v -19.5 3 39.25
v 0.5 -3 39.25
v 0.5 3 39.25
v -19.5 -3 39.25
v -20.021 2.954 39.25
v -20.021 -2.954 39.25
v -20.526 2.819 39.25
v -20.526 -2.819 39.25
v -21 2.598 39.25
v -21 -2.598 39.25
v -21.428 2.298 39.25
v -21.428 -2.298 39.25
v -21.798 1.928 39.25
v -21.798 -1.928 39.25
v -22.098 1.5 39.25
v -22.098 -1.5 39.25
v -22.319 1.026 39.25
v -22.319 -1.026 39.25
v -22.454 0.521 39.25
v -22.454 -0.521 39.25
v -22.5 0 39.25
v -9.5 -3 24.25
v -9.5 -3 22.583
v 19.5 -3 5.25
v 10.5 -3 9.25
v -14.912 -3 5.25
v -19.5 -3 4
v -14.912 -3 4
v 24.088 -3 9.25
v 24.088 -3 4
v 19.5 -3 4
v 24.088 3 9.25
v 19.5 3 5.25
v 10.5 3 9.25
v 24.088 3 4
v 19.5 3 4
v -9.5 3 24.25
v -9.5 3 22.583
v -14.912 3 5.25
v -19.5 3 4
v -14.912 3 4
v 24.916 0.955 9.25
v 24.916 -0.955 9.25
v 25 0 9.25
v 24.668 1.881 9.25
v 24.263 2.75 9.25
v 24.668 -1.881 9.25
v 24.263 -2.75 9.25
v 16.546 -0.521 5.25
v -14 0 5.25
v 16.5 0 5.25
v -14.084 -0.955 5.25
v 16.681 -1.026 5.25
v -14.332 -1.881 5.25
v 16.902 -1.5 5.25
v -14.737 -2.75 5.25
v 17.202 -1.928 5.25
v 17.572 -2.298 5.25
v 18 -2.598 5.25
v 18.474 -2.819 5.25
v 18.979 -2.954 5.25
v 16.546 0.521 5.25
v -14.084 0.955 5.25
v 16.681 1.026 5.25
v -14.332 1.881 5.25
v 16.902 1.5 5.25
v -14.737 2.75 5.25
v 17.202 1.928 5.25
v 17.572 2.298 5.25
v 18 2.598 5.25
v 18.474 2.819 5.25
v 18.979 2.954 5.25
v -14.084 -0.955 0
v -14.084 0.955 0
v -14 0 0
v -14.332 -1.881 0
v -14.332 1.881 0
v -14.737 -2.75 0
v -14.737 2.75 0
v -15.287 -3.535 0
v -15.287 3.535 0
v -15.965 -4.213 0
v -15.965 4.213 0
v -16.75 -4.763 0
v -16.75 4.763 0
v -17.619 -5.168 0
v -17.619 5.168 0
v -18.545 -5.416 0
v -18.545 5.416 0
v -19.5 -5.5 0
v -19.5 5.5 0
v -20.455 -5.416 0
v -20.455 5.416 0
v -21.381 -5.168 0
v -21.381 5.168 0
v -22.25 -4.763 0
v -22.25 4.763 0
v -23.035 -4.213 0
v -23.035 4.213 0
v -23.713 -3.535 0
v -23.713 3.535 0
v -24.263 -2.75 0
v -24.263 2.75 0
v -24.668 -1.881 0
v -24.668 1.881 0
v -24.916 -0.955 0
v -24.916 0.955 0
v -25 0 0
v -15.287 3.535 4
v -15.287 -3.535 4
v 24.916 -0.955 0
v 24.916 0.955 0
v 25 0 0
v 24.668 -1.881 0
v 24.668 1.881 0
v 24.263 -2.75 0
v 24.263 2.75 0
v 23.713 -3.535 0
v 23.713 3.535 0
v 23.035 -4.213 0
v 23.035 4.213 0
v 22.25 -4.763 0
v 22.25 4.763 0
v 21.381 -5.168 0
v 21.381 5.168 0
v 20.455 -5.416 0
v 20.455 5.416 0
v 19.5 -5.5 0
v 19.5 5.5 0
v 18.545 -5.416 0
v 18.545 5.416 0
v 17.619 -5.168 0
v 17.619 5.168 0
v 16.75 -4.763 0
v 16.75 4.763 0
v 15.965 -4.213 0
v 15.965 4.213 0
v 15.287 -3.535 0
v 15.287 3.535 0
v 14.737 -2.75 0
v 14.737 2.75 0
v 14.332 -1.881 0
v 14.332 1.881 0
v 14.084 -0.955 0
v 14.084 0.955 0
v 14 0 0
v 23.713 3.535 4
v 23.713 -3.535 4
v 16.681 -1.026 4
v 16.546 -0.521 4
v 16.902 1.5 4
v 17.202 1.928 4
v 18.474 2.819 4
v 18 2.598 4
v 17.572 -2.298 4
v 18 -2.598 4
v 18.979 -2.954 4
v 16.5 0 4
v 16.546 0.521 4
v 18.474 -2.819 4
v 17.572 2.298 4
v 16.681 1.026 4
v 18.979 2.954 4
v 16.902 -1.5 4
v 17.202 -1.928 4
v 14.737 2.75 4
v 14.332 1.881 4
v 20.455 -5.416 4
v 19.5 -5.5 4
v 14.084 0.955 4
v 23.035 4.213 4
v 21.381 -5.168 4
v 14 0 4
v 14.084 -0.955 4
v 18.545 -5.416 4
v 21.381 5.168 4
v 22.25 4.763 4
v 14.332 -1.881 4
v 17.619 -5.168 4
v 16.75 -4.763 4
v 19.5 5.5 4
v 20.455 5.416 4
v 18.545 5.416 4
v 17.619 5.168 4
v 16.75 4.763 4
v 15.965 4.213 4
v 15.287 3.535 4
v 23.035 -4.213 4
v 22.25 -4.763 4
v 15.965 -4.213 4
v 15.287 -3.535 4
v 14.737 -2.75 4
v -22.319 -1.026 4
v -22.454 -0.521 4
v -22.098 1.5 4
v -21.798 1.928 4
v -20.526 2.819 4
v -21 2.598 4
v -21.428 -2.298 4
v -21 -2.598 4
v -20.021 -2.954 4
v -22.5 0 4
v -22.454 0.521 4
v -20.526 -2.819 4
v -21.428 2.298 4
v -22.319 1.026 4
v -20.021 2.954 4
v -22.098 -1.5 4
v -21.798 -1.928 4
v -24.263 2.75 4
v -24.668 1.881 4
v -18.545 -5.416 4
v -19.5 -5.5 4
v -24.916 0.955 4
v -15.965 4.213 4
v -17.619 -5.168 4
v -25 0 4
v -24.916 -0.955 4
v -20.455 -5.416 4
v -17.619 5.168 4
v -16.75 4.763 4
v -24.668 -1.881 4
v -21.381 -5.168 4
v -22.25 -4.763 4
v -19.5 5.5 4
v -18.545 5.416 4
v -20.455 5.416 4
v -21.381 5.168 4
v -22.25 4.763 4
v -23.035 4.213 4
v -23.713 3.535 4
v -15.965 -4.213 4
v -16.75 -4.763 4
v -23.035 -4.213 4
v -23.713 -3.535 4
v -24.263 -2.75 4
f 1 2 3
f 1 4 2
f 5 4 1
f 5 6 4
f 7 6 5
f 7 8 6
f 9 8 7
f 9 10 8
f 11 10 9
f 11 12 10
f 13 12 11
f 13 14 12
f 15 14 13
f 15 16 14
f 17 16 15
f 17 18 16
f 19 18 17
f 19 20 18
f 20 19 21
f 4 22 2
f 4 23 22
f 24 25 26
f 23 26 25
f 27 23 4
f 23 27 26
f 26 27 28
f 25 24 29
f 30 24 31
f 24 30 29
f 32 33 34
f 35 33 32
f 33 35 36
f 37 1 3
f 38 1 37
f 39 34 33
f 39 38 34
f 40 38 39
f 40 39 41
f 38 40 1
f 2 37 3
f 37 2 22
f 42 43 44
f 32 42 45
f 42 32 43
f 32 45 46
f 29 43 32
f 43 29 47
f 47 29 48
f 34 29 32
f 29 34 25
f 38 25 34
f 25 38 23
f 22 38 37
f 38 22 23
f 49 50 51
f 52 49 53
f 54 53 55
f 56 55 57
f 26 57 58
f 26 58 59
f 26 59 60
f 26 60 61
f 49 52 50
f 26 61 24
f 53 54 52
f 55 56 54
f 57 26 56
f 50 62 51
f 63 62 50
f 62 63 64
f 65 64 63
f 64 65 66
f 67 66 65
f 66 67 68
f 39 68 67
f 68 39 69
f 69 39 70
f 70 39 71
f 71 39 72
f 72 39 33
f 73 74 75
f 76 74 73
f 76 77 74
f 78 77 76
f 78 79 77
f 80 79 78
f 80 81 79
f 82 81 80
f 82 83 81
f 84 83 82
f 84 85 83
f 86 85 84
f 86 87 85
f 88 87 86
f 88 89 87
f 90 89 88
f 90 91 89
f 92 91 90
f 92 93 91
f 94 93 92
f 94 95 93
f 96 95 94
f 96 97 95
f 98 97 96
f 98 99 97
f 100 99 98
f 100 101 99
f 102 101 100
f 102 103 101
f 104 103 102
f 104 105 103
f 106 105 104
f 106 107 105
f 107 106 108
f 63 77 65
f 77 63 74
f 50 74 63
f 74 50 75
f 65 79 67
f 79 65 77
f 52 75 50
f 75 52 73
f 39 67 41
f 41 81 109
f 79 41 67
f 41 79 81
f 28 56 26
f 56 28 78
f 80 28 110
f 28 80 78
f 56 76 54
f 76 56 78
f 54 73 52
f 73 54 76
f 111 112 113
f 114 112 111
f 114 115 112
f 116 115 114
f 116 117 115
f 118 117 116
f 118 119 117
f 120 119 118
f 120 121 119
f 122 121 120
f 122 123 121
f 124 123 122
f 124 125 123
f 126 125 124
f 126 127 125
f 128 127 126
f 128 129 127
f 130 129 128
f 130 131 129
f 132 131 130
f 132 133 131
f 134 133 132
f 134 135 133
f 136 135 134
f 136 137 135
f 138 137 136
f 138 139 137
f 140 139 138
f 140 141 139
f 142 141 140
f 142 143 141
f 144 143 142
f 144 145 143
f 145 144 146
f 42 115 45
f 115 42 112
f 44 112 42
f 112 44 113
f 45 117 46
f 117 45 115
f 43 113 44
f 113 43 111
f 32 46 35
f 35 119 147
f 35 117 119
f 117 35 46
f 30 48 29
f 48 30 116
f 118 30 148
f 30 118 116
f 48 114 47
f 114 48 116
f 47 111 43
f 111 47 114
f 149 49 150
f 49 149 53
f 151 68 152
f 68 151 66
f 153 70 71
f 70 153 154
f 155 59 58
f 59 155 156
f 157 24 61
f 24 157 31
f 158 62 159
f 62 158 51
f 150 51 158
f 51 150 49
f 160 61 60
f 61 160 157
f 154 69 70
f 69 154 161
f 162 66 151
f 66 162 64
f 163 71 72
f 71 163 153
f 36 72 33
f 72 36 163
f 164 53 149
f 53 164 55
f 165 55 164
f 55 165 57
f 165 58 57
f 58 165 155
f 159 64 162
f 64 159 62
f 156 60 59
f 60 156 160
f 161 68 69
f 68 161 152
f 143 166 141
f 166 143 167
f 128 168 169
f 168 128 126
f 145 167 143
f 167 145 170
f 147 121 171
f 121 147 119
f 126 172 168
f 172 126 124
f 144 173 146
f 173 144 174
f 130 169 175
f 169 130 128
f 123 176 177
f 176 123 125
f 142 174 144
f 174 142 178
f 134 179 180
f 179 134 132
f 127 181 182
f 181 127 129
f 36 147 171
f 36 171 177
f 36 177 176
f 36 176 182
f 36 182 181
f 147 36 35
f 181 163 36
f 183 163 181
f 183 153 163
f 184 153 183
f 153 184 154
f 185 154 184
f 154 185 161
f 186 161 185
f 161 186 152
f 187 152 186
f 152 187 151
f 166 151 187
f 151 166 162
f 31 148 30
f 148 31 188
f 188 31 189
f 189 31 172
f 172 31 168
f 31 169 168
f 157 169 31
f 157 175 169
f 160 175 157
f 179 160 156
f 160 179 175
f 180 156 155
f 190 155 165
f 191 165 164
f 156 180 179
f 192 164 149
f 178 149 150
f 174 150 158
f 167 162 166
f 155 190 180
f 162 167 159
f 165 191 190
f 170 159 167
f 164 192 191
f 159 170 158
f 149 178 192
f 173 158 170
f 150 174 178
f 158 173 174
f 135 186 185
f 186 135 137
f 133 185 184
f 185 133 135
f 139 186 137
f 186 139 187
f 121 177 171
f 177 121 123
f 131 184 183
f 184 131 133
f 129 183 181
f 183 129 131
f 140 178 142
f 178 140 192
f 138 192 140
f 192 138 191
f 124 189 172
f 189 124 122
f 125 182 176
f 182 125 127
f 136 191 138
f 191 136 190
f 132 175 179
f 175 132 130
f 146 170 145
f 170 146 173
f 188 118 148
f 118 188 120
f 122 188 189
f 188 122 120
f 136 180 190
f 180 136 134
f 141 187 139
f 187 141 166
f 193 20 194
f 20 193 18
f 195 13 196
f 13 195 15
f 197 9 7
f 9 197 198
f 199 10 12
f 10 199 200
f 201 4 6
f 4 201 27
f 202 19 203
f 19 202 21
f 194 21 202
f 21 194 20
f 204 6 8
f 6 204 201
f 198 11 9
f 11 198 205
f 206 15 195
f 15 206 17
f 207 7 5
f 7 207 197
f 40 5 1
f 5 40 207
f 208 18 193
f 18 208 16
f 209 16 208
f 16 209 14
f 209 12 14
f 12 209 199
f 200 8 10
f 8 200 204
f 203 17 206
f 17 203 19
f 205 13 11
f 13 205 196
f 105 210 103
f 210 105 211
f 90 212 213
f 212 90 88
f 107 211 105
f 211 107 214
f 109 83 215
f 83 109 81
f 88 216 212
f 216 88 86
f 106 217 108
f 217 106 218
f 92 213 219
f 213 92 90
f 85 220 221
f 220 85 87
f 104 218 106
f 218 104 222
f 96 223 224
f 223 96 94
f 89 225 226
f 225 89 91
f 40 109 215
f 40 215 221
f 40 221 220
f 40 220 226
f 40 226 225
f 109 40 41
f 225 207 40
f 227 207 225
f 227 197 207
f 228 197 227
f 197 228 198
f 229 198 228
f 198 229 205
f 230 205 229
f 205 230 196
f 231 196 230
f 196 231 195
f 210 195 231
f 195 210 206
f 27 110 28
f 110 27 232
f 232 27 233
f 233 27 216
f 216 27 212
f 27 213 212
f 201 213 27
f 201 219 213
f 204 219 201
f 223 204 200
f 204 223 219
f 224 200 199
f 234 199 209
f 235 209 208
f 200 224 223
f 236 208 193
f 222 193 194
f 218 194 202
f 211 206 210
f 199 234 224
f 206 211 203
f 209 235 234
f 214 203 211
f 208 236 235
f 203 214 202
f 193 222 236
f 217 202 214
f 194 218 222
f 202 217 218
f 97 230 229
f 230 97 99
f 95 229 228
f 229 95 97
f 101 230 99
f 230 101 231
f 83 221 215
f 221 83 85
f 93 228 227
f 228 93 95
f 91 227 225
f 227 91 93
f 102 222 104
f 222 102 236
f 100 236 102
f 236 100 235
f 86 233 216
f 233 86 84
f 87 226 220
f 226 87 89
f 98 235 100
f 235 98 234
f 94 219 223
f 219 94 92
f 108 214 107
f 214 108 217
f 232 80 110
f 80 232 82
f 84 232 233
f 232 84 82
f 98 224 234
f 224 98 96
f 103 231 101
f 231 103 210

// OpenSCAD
// [FL_INDEX: keywords="openscad, 3d_parametric, Parametric_Boltless_Hook_for_keyhole_shelving_units, csg_solid" | COT="Parametric OpenSCAD design from 3DCodeverse"]
// Title: Parametric Boltless Hook for keyhole shelving units

// for precise messurement points see the supplied pictures

//diameter of the large round part of the key hole,make smaller then real (for clearaces)
key_big = 11;
//diameter of the small offshoot from the main key cylinder,make smaller then real (for clearaces)
key_small = 6;

//distance from one key hole to the same point in the next key hole, make slightly bigger then real (for clearaces)
key_spacing = 39;
//thickness of the material the key holes are kut out of, make slightly bigger then real (for clearaces)
key_thickness = 1.25;

//the distance the hook extends from the support, poke should be bigger then hook
poke = 30;
//total hight if hook tip, hook width will = half this, hook should be smaller then poke
hook = 20;
//thickness of lugs and support bar
support_thickness = 4;


//turning the numbers into what object needs

hookStart = support_thickness*2+key_thickness;
angle = atan ( hook / poke);
hype = poke + hook;
KBR = key_big/2;
KSR = key_small/2;
 
module wedge()  {
	translate([0,-key_small,0]) difference() {
		cube([poke,key_small,hook]);
		rotate(a=[0,-angle,0])translate([0,-1,0])cube([hype,key_small+2,hook]);
	}	}

module betterjoints() {
	intersection(){
		translate([0,-KSR,0])cube([key_spacing,key_small,support_thickness*2+key_thickness]);
		cylinder(h= support_thickness*2+key_thickness ,r1 = KBR , r2 = KBR,$fn=36);
	}
}

translate([-KBR- key_spacing/2,-KBR,0]) {		//to centre item on the build platform


translate([KBR,KBR - KSR,hookStart]) {		//hook and support bar making section
	cube([hook/2,key_small,poke]);
	rotate(a=[0,270,180]) wedge();
	translate([poke,0,0])rotate(a=[0,0,180]) wedge();
	translate([0,0,-support_thickness]) cube([key_spacing,key_small,support_thickness]);
	}

translate([KBR,KBR,0]) {								//post 1
	cylinder(h= hookStart + poke, r1 = KSR ,r2 = KSR,$fn=36);
	cylinder(h= support_thickness ,r1 = KBR , r2 = KBR,$fn=36);
	betterjoints();
	translate([key_spacing,0,0]){						//post 2
		cylinder(h= hookStart, r1 = KSR ,r2 = KSR,$fn=36);
		cylinder(h= support_thickness ,r1 = KBR , r2 = KBR,$fn=36);
		betterjoints();
		}
	}
}
